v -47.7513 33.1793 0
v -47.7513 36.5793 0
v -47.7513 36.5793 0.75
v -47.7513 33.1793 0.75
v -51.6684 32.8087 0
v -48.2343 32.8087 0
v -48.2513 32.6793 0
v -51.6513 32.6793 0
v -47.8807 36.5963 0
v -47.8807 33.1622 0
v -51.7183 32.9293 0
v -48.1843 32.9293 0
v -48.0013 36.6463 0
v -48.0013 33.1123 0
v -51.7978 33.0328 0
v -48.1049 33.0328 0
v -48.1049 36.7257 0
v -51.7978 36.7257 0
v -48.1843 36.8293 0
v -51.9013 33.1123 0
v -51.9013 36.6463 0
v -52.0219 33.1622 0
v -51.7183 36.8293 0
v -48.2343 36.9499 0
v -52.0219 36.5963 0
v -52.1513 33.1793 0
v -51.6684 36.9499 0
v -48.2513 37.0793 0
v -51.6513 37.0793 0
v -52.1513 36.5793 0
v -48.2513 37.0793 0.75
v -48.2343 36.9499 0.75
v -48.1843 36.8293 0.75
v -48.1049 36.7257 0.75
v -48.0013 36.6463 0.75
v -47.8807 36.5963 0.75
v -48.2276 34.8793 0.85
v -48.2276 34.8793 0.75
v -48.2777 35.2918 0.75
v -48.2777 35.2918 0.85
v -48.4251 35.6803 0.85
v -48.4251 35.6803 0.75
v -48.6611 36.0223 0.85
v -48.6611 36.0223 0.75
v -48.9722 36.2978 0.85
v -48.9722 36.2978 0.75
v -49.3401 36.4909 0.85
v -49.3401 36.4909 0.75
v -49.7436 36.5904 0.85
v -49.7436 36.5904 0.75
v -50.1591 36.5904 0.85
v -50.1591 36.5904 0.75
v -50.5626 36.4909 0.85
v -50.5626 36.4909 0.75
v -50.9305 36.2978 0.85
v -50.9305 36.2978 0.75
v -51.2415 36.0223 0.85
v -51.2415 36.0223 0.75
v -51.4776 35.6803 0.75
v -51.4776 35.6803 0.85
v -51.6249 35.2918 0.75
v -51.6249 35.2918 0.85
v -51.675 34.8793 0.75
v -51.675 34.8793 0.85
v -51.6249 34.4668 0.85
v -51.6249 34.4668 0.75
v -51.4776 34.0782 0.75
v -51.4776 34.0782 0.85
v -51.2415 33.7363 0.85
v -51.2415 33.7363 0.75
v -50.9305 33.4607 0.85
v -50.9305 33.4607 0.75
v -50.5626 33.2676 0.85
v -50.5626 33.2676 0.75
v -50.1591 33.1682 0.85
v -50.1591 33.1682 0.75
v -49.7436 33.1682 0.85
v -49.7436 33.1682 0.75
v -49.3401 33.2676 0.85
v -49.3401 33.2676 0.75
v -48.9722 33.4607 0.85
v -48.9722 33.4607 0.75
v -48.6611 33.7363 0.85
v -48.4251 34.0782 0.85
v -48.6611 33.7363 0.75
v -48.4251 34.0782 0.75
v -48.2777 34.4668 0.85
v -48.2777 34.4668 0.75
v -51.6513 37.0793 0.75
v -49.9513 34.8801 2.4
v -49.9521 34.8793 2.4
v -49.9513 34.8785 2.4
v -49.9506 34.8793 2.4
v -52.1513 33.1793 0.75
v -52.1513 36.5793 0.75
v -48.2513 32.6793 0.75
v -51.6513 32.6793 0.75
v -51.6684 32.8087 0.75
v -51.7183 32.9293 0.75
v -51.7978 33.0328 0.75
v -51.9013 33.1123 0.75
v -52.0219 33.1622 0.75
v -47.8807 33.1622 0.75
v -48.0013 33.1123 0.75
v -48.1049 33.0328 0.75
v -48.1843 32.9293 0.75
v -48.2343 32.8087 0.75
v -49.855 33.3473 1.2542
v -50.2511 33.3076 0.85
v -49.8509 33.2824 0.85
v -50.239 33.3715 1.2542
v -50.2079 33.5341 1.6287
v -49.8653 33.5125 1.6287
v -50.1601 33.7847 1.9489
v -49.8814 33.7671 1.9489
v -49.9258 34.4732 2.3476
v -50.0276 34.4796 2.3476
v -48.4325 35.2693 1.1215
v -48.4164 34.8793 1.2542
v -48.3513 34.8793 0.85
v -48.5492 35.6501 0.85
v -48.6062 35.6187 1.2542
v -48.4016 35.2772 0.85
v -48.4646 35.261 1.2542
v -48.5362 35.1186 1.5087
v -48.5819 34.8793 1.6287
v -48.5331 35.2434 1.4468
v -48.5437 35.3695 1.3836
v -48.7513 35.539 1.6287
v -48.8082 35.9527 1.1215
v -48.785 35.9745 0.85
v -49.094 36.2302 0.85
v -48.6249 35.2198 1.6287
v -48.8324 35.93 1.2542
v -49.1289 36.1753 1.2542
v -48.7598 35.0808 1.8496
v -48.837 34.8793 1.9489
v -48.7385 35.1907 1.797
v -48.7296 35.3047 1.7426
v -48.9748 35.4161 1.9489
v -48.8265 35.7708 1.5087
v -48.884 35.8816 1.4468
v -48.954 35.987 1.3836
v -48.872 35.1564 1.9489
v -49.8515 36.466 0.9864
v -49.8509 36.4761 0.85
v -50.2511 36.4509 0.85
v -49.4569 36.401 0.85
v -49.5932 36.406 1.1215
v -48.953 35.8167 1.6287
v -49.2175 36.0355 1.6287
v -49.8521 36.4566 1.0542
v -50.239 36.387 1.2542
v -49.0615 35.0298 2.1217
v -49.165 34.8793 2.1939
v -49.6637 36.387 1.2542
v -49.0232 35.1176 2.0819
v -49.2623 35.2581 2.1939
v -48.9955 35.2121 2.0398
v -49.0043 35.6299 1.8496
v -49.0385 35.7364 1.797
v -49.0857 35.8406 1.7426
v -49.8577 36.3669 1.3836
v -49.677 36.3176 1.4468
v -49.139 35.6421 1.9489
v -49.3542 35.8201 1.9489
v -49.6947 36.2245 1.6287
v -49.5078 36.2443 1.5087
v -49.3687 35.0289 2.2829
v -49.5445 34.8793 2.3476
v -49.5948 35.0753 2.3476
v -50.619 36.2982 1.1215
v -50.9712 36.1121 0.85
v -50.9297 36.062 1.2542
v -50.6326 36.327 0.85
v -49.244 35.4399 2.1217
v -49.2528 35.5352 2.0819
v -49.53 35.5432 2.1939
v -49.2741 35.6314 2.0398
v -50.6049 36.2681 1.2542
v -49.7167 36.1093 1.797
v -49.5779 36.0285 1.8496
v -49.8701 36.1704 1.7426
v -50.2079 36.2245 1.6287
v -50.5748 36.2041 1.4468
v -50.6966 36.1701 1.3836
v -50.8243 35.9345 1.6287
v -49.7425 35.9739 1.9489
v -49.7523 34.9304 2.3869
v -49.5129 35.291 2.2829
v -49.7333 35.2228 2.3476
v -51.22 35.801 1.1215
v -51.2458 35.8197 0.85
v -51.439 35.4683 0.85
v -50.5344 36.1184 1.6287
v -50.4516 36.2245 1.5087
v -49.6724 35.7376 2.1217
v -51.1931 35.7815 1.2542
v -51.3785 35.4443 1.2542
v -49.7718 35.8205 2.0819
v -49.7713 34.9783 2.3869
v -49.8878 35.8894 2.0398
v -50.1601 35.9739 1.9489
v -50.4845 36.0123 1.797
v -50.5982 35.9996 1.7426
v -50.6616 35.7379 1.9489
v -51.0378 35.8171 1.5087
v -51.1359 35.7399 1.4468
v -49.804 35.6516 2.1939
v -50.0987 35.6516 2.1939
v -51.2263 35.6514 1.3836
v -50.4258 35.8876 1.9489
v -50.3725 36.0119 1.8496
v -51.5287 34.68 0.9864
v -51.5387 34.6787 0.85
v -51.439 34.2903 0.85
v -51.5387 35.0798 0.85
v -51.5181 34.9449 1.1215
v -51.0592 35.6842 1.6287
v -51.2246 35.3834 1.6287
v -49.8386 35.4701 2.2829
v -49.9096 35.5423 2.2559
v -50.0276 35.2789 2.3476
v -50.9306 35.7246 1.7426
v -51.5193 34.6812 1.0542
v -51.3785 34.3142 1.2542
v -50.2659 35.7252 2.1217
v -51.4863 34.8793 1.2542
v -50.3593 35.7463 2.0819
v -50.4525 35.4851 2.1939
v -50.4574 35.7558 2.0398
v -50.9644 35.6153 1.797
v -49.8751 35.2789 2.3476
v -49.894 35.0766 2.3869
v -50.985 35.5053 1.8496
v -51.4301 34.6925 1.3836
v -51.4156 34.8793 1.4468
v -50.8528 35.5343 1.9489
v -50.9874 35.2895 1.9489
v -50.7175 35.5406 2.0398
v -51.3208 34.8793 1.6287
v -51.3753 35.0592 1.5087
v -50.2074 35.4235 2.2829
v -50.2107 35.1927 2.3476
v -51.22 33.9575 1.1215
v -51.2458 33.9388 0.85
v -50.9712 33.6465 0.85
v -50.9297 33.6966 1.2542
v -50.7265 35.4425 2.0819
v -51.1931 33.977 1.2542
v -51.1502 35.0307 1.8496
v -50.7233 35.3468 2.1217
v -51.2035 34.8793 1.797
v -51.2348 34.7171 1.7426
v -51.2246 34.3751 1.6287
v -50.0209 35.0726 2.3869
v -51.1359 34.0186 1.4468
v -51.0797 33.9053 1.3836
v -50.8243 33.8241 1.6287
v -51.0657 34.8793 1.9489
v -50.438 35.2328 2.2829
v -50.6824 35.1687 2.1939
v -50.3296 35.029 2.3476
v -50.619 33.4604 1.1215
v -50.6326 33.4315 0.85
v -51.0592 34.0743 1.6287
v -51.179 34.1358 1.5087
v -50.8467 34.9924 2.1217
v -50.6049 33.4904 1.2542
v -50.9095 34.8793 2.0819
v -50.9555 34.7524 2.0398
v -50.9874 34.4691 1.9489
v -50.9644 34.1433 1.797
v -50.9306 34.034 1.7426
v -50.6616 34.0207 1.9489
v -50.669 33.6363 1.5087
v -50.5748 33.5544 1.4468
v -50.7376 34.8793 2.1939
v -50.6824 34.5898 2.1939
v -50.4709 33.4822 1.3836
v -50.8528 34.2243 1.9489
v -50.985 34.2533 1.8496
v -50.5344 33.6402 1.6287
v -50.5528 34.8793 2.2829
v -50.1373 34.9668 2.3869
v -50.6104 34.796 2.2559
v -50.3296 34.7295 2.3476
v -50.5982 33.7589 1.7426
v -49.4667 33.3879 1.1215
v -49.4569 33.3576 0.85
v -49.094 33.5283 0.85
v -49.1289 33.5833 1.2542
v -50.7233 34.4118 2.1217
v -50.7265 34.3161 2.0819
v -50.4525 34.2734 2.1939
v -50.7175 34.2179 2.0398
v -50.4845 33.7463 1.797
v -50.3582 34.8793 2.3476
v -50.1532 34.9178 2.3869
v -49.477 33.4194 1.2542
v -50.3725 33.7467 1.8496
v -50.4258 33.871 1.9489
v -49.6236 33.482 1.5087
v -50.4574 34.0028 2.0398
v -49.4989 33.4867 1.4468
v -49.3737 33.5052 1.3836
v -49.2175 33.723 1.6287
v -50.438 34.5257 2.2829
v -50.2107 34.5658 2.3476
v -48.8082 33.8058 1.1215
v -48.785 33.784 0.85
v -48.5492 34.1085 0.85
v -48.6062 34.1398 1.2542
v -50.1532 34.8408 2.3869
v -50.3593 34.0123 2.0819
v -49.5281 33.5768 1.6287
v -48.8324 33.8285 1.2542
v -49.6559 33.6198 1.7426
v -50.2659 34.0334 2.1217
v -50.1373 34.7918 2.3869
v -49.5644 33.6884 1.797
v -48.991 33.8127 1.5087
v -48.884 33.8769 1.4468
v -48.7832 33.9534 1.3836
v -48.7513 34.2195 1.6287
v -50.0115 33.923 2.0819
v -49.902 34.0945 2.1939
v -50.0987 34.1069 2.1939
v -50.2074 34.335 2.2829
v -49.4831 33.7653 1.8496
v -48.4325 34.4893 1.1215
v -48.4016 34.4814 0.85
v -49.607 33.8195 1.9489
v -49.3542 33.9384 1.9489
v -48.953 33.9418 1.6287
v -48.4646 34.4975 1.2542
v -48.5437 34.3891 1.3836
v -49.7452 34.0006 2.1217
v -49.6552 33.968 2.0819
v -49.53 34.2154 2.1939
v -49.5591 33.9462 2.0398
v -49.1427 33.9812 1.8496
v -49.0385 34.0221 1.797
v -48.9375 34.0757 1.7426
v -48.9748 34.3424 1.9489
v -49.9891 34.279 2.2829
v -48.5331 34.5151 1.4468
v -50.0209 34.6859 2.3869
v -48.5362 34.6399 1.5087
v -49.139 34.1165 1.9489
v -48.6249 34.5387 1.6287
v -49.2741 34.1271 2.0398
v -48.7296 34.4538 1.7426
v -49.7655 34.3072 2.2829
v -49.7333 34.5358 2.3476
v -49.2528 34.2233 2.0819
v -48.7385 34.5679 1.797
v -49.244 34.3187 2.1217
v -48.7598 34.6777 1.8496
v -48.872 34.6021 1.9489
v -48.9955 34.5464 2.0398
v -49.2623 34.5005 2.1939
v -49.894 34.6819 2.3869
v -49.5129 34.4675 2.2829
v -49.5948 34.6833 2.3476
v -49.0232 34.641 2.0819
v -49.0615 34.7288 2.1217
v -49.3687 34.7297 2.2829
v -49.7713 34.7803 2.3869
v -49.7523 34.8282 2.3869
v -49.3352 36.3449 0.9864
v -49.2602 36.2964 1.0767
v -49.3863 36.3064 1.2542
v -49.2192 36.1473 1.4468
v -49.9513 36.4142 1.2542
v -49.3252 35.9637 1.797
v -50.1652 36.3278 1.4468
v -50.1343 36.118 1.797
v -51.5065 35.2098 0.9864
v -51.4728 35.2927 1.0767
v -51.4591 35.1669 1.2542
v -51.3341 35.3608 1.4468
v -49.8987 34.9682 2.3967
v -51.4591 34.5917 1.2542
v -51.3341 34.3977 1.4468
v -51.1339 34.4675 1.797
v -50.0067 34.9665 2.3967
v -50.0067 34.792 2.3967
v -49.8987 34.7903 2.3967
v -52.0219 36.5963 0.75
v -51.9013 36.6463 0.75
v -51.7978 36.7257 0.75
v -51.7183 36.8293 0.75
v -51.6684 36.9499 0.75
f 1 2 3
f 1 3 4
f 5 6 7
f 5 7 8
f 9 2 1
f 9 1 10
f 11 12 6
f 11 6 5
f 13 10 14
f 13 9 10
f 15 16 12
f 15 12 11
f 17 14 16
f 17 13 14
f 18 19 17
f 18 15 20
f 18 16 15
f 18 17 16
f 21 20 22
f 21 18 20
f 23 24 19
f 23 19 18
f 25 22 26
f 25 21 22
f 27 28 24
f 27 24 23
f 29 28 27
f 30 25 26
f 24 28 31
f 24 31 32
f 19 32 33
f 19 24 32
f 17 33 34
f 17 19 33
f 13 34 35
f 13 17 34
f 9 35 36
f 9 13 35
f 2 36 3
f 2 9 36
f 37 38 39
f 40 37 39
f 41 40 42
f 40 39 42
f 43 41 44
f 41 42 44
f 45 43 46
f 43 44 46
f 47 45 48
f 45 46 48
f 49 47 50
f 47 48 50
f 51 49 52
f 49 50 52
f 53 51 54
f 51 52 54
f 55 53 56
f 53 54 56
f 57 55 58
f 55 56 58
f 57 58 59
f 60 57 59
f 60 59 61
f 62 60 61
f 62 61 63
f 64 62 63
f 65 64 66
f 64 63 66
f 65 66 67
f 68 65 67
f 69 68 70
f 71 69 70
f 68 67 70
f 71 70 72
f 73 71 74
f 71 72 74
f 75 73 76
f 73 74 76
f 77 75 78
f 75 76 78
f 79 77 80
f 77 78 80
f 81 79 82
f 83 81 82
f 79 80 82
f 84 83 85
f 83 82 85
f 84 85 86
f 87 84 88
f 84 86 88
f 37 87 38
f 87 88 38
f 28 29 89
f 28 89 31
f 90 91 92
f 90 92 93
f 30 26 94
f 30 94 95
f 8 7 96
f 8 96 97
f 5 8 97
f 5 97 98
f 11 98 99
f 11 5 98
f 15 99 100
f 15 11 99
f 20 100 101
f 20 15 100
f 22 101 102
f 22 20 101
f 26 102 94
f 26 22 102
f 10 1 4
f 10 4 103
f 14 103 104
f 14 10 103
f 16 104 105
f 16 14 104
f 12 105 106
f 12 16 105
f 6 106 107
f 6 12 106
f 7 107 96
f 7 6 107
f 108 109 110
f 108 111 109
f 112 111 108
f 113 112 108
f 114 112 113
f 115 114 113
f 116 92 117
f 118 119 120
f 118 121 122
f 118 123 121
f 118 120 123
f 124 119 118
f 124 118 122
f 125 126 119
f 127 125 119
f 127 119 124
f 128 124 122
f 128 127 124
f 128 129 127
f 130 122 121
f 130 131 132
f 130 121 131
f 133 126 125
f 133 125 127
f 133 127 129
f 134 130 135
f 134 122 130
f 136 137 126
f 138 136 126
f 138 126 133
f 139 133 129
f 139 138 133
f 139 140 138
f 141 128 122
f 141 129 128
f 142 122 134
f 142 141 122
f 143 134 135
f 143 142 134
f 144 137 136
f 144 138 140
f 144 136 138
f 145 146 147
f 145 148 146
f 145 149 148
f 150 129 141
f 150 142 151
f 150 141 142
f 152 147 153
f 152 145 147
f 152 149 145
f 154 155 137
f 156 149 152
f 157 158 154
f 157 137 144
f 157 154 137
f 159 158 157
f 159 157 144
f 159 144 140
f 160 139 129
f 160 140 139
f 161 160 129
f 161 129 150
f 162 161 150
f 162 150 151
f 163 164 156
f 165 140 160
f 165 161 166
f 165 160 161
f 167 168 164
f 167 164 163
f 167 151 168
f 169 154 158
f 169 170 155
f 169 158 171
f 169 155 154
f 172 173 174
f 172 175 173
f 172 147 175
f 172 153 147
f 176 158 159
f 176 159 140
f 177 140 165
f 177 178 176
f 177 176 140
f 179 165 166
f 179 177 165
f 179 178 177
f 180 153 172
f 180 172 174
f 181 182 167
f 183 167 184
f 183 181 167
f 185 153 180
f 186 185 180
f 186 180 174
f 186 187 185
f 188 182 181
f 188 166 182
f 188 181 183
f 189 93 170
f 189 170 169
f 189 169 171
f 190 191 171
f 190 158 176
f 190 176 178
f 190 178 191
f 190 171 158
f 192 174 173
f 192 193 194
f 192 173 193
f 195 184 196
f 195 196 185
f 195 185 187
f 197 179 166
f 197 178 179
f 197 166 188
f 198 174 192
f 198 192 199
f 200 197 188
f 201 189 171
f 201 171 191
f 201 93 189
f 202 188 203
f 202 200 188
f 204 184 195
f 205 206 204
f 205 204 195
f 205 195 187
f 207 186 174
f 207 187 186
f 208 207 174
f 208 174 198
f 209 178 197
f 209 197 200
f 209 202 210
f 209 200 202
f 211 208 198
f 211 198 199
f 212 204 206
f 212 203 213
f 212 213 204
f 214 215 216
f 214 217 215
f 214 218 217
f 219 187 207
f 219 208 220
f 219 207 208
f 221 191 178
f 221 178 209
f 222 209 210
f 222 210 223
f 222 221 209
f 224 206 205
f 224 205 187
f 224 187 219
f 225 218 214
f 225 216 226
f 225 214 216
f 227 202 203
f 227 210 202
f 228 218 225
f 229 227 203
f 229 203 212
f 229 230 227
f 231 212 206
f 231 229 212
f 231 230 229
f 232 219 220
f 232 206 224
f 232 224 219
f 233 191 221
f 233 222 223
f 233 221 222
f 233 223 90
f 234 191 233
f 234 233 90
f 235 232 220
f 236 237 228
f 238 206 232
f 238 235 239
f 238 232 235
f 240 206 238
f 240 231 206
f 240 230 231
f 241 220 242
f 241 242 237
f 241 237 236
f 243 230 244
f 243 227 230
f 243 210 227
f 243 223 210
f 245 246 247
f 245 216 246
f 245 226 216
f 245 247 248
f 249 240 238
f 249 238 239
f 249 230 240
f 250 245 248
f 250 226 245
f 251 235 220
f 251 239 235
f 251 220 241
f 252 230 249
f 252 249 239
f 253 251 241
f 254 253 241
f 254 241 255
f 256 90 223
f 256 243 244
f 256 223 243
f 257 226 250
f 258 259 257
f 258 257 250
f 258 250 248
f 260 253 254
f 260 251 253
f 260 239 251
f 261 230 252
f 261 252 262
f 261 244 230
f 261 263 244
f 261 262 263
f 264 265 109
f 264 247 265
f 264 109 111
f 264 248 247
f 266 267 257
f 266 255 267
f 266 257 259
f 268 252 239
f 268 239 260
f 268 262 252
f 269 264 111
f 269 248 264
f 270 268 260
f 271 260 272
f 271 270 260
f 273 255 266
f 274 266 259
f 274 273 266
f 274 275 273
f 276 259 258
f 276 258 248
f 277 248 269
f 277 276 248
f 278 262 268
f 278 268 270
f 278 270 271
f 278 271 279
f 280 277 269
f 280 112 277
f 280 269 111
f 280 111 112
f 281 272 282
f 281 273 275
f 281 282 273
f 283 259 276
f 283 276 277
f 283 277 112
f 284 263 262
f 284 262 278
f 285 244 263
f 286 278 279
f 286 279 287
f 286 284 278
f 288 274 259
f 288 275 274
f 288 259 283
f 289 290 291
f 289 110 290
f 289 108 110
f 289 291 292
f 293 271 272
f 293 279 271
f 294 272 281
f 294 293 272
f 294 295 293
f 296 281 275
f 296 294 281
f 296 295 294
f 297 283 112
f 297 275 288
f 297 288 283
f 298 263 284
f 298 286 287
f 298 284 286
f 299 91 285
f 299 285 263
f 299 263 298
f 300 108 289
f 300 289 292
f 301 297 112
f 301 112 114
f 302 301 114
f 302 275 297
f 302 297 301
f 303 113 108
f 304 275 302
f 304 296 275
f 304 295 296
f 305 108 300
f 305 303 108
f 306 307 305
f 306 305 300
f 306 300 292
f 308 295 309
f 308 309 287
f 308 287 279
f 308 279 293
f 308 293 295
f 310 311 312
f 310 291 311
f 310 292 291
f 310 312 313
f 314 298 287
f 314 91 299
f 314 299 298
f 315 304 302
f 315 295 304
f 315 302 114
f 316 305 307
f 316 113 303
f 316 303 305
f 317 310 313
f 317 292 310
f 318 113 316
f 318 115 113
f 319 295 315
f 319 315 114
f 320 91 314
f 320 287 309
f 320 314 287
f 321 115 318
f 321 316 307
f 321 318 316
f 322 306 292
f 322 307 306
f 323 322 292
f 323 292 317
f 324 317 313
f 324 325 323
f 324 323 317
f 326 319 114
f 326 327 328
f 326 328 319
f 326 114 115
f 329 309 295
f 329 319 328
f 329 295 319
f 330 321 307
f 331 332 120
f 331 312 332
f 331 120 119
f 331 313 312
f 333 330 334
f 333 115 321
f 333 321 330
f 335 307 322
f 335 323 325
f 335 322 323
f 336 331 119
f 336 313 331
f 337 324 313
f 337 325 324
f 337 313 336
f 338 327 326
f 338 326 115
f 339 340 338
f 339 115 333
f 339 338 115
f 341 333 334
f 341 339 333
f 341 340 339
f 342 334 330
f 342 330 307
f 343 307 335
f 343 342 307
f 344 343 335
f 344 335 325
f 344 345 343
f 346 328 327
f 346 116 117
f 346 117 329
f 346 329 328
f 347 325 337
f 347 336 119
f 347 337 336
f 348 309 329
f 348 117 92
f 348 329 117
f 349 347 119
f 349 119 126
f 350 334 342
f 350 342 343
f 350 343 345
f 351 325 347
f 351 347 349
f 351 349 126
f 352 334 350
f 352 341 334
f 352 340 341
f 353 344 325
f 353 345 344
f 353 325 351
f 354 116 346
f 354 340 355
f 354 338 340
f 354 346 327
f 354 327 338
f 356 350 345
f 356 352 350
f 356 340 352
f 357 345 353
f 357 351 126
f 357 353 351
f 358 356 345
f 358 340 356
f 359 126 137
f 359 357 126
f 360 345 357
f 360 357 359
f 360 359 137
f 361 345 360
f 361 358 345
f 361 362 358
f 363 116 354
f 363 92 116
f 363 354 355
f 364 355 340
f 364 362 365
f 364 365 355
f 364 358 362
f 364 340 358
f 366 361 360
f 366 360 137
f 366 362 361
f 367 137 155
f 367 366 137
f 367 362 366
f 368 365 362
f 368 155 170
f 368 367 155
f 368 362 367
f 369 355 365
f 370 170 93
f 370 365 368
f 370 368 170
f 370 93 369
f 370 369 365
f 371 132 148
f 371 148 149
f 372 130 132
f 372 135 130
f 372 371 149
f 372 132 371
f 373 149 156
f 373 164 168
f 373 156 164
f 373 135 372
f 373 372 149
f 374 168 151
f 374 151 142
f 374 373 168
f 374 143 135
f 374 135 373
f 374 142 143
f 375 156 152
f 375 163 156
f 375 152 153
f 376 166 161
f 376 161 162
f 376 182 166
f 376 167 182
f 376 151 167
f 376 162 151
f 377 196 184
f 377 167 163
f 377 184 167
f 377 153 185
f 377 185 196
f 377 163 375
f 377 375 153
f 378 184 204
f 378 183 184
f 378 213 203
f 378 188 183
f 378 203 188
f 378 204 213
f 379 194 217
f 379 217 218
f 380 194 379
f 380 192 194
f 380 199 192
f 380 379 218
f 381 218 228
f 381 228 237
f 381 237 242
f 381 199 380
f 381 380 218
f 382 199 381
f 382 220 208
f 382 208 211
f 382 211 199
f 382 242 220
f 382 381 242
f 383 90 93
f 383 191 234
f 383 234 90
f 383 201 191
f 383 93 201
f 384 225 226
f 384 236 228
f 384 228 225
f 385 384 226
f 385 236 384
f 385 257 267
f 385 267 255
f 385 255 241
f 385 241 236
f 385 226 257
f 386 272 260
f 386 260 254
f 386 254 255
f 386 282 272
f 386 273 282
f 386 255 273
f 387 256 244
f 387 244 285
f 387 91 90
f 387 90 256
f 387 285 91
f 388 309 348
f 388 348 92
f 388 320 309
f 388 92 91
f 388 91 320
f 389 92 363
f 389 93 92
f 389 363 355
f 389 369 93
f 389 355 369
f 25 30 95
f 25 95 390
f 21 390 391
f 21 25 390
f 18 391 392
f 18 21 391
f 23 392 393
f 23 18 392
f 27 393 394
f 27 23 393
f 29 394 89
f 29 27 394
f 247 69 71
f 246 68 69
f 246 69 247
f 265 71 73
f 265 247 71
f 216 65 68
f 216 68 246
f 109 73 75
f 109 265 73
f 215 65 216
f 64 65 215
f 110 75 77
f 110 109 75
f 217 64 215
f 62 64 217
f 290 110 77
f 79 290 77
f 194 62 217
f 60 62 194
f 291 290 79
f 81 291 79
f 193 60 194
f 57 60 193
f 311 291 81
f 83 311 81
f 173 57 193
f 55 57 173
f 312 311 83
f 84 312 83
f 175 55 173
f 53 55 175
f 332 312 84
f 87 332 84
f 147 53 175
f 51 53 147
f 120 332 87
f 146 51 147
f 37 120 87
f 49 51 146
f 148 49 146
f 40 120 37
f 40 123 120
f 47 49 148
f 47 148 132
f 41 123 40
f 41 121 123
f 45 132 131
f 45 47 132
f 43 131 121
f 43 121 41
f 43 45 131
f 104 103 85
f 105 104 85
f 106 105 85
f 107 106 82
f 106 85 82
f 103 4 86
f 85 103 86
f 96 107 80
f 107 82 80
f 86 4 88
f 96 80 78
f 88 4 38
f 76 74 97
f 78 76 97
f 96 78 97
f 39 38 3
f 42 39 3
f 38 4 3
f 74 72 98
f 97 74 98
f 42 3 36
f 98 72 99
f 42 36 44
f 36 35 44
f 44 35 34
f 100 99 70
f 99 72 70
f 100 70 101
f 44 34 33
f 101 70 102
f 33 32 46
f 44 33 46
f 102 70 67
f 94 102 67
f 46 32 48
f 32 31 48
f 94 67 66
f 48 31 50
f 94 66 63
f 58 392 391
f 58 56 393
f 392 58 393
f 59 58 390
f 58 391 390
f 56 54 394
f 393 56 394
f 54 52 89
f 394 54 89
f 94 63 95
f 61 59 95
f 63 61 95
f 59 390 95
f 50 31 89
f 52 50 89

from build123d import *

# Parameters (mm, degrees)
P_IDAT_VYSUNUT_M1_DEPTH = 0.75
SKICA4_R                = 1.723681802
P_IDAT_VYSUNUT_M3_DEPTH = 0.1
SKICA5_R                = 1.6
P_IDAT_VYSUNUT_M4_DEPTH = 1.65
ZAOBLIT7_R              = 1.6


with BuildPart() as part:
    # Skica1 → Přidat vysunutím1 (new body)
    with BuildSketch(Plane.XY):
        with BuildLine():
            Line((-51.651331746, 37.07927242), (-48.251331746, 37.07927242))
            ThreePointArc((-48.251331746, 37.07927242), (-48.104885136, 36.725719029), (-47.751331746, 36.57927242))
            Line((-47.751331746, 36.57927242), (-47.751331746, 33.17927242))
            ThreePointArc((-47.751331746, 33.17927242), (-48.104885136, 33.03282581), (-48.251331746, 32.67927242))
            Line((-48.251331746, 32.67927242), (-51.651331746, 32.67927242))
            ThreePointArc((-51.651331746, 32.67927242), (-51.797778355, 33.03282581), (-52.151331746, 33.17927242))
            Line((-52.151331746, 33.17927242), (-52.151331746, 36.57927242))
            ThreePointArc((-52.151331746, 36.57927242), (-51.797778355, 36.725719029), (-51.651331746, 37.07927242))
        make_face()
    extrude(amount=P_IDAT_VYSUNUT_M1_DEPTH)

    # Skica4 → Přidat vysunutím3 (add)
    with BuildSketch(Plane.XY.offset(0.75)):
        with Locations((-49.951331746, 34.87927242)):
            Circle(SKICA4_R)
    extrude(amount=P_IDAT_VYSUNUT_M3_DEPTH)

    # Skica5 → Přidat vysunutím4 (add)
    with BuildSketch(Plane.XY.offset(0.75)):
        with Locations((-49.951331746, 34.87927242)):
            Circle(SKICA5_R)
    extrude(amount=P_IDAT_VYSUNUT_M4_DEPTH)

    # Zaoblit7
    # the kernel refuses this fillet: 1.6 mm, written as the material it takes off along each edge
    with BuildSketch(Plane(origin=(-49.951331746, 34.87927242, 2.4), x_dir=(1, 0, 0), z_dir=(0, -1, 0))) as zaoblit7_piece_1:
        with BuildLine():
            CenterArc((0.000781441, -1.6), ZAOBLIT7_R, 1.790784659, 88.209215341)
            Line((0.000781441, 0), (0.000781441, 0.032))
            Line((0.000781441, 0.032), (1.6, 0.032))
            Line((1.6, 0.032), (1.632, 0))
            ThreePointArc((1.632, 0), (1.632, -0.775), (1.631984371, -1.549))
            Line((1.631984371, -1.549), (1.6, -1.55))
        make_face()
    revolve(axis=Axis((-49.951331746, 34.87927242, 2.4), (0, 0, 1)), mode=Mode.SUBTRACT)


solid = part.part
